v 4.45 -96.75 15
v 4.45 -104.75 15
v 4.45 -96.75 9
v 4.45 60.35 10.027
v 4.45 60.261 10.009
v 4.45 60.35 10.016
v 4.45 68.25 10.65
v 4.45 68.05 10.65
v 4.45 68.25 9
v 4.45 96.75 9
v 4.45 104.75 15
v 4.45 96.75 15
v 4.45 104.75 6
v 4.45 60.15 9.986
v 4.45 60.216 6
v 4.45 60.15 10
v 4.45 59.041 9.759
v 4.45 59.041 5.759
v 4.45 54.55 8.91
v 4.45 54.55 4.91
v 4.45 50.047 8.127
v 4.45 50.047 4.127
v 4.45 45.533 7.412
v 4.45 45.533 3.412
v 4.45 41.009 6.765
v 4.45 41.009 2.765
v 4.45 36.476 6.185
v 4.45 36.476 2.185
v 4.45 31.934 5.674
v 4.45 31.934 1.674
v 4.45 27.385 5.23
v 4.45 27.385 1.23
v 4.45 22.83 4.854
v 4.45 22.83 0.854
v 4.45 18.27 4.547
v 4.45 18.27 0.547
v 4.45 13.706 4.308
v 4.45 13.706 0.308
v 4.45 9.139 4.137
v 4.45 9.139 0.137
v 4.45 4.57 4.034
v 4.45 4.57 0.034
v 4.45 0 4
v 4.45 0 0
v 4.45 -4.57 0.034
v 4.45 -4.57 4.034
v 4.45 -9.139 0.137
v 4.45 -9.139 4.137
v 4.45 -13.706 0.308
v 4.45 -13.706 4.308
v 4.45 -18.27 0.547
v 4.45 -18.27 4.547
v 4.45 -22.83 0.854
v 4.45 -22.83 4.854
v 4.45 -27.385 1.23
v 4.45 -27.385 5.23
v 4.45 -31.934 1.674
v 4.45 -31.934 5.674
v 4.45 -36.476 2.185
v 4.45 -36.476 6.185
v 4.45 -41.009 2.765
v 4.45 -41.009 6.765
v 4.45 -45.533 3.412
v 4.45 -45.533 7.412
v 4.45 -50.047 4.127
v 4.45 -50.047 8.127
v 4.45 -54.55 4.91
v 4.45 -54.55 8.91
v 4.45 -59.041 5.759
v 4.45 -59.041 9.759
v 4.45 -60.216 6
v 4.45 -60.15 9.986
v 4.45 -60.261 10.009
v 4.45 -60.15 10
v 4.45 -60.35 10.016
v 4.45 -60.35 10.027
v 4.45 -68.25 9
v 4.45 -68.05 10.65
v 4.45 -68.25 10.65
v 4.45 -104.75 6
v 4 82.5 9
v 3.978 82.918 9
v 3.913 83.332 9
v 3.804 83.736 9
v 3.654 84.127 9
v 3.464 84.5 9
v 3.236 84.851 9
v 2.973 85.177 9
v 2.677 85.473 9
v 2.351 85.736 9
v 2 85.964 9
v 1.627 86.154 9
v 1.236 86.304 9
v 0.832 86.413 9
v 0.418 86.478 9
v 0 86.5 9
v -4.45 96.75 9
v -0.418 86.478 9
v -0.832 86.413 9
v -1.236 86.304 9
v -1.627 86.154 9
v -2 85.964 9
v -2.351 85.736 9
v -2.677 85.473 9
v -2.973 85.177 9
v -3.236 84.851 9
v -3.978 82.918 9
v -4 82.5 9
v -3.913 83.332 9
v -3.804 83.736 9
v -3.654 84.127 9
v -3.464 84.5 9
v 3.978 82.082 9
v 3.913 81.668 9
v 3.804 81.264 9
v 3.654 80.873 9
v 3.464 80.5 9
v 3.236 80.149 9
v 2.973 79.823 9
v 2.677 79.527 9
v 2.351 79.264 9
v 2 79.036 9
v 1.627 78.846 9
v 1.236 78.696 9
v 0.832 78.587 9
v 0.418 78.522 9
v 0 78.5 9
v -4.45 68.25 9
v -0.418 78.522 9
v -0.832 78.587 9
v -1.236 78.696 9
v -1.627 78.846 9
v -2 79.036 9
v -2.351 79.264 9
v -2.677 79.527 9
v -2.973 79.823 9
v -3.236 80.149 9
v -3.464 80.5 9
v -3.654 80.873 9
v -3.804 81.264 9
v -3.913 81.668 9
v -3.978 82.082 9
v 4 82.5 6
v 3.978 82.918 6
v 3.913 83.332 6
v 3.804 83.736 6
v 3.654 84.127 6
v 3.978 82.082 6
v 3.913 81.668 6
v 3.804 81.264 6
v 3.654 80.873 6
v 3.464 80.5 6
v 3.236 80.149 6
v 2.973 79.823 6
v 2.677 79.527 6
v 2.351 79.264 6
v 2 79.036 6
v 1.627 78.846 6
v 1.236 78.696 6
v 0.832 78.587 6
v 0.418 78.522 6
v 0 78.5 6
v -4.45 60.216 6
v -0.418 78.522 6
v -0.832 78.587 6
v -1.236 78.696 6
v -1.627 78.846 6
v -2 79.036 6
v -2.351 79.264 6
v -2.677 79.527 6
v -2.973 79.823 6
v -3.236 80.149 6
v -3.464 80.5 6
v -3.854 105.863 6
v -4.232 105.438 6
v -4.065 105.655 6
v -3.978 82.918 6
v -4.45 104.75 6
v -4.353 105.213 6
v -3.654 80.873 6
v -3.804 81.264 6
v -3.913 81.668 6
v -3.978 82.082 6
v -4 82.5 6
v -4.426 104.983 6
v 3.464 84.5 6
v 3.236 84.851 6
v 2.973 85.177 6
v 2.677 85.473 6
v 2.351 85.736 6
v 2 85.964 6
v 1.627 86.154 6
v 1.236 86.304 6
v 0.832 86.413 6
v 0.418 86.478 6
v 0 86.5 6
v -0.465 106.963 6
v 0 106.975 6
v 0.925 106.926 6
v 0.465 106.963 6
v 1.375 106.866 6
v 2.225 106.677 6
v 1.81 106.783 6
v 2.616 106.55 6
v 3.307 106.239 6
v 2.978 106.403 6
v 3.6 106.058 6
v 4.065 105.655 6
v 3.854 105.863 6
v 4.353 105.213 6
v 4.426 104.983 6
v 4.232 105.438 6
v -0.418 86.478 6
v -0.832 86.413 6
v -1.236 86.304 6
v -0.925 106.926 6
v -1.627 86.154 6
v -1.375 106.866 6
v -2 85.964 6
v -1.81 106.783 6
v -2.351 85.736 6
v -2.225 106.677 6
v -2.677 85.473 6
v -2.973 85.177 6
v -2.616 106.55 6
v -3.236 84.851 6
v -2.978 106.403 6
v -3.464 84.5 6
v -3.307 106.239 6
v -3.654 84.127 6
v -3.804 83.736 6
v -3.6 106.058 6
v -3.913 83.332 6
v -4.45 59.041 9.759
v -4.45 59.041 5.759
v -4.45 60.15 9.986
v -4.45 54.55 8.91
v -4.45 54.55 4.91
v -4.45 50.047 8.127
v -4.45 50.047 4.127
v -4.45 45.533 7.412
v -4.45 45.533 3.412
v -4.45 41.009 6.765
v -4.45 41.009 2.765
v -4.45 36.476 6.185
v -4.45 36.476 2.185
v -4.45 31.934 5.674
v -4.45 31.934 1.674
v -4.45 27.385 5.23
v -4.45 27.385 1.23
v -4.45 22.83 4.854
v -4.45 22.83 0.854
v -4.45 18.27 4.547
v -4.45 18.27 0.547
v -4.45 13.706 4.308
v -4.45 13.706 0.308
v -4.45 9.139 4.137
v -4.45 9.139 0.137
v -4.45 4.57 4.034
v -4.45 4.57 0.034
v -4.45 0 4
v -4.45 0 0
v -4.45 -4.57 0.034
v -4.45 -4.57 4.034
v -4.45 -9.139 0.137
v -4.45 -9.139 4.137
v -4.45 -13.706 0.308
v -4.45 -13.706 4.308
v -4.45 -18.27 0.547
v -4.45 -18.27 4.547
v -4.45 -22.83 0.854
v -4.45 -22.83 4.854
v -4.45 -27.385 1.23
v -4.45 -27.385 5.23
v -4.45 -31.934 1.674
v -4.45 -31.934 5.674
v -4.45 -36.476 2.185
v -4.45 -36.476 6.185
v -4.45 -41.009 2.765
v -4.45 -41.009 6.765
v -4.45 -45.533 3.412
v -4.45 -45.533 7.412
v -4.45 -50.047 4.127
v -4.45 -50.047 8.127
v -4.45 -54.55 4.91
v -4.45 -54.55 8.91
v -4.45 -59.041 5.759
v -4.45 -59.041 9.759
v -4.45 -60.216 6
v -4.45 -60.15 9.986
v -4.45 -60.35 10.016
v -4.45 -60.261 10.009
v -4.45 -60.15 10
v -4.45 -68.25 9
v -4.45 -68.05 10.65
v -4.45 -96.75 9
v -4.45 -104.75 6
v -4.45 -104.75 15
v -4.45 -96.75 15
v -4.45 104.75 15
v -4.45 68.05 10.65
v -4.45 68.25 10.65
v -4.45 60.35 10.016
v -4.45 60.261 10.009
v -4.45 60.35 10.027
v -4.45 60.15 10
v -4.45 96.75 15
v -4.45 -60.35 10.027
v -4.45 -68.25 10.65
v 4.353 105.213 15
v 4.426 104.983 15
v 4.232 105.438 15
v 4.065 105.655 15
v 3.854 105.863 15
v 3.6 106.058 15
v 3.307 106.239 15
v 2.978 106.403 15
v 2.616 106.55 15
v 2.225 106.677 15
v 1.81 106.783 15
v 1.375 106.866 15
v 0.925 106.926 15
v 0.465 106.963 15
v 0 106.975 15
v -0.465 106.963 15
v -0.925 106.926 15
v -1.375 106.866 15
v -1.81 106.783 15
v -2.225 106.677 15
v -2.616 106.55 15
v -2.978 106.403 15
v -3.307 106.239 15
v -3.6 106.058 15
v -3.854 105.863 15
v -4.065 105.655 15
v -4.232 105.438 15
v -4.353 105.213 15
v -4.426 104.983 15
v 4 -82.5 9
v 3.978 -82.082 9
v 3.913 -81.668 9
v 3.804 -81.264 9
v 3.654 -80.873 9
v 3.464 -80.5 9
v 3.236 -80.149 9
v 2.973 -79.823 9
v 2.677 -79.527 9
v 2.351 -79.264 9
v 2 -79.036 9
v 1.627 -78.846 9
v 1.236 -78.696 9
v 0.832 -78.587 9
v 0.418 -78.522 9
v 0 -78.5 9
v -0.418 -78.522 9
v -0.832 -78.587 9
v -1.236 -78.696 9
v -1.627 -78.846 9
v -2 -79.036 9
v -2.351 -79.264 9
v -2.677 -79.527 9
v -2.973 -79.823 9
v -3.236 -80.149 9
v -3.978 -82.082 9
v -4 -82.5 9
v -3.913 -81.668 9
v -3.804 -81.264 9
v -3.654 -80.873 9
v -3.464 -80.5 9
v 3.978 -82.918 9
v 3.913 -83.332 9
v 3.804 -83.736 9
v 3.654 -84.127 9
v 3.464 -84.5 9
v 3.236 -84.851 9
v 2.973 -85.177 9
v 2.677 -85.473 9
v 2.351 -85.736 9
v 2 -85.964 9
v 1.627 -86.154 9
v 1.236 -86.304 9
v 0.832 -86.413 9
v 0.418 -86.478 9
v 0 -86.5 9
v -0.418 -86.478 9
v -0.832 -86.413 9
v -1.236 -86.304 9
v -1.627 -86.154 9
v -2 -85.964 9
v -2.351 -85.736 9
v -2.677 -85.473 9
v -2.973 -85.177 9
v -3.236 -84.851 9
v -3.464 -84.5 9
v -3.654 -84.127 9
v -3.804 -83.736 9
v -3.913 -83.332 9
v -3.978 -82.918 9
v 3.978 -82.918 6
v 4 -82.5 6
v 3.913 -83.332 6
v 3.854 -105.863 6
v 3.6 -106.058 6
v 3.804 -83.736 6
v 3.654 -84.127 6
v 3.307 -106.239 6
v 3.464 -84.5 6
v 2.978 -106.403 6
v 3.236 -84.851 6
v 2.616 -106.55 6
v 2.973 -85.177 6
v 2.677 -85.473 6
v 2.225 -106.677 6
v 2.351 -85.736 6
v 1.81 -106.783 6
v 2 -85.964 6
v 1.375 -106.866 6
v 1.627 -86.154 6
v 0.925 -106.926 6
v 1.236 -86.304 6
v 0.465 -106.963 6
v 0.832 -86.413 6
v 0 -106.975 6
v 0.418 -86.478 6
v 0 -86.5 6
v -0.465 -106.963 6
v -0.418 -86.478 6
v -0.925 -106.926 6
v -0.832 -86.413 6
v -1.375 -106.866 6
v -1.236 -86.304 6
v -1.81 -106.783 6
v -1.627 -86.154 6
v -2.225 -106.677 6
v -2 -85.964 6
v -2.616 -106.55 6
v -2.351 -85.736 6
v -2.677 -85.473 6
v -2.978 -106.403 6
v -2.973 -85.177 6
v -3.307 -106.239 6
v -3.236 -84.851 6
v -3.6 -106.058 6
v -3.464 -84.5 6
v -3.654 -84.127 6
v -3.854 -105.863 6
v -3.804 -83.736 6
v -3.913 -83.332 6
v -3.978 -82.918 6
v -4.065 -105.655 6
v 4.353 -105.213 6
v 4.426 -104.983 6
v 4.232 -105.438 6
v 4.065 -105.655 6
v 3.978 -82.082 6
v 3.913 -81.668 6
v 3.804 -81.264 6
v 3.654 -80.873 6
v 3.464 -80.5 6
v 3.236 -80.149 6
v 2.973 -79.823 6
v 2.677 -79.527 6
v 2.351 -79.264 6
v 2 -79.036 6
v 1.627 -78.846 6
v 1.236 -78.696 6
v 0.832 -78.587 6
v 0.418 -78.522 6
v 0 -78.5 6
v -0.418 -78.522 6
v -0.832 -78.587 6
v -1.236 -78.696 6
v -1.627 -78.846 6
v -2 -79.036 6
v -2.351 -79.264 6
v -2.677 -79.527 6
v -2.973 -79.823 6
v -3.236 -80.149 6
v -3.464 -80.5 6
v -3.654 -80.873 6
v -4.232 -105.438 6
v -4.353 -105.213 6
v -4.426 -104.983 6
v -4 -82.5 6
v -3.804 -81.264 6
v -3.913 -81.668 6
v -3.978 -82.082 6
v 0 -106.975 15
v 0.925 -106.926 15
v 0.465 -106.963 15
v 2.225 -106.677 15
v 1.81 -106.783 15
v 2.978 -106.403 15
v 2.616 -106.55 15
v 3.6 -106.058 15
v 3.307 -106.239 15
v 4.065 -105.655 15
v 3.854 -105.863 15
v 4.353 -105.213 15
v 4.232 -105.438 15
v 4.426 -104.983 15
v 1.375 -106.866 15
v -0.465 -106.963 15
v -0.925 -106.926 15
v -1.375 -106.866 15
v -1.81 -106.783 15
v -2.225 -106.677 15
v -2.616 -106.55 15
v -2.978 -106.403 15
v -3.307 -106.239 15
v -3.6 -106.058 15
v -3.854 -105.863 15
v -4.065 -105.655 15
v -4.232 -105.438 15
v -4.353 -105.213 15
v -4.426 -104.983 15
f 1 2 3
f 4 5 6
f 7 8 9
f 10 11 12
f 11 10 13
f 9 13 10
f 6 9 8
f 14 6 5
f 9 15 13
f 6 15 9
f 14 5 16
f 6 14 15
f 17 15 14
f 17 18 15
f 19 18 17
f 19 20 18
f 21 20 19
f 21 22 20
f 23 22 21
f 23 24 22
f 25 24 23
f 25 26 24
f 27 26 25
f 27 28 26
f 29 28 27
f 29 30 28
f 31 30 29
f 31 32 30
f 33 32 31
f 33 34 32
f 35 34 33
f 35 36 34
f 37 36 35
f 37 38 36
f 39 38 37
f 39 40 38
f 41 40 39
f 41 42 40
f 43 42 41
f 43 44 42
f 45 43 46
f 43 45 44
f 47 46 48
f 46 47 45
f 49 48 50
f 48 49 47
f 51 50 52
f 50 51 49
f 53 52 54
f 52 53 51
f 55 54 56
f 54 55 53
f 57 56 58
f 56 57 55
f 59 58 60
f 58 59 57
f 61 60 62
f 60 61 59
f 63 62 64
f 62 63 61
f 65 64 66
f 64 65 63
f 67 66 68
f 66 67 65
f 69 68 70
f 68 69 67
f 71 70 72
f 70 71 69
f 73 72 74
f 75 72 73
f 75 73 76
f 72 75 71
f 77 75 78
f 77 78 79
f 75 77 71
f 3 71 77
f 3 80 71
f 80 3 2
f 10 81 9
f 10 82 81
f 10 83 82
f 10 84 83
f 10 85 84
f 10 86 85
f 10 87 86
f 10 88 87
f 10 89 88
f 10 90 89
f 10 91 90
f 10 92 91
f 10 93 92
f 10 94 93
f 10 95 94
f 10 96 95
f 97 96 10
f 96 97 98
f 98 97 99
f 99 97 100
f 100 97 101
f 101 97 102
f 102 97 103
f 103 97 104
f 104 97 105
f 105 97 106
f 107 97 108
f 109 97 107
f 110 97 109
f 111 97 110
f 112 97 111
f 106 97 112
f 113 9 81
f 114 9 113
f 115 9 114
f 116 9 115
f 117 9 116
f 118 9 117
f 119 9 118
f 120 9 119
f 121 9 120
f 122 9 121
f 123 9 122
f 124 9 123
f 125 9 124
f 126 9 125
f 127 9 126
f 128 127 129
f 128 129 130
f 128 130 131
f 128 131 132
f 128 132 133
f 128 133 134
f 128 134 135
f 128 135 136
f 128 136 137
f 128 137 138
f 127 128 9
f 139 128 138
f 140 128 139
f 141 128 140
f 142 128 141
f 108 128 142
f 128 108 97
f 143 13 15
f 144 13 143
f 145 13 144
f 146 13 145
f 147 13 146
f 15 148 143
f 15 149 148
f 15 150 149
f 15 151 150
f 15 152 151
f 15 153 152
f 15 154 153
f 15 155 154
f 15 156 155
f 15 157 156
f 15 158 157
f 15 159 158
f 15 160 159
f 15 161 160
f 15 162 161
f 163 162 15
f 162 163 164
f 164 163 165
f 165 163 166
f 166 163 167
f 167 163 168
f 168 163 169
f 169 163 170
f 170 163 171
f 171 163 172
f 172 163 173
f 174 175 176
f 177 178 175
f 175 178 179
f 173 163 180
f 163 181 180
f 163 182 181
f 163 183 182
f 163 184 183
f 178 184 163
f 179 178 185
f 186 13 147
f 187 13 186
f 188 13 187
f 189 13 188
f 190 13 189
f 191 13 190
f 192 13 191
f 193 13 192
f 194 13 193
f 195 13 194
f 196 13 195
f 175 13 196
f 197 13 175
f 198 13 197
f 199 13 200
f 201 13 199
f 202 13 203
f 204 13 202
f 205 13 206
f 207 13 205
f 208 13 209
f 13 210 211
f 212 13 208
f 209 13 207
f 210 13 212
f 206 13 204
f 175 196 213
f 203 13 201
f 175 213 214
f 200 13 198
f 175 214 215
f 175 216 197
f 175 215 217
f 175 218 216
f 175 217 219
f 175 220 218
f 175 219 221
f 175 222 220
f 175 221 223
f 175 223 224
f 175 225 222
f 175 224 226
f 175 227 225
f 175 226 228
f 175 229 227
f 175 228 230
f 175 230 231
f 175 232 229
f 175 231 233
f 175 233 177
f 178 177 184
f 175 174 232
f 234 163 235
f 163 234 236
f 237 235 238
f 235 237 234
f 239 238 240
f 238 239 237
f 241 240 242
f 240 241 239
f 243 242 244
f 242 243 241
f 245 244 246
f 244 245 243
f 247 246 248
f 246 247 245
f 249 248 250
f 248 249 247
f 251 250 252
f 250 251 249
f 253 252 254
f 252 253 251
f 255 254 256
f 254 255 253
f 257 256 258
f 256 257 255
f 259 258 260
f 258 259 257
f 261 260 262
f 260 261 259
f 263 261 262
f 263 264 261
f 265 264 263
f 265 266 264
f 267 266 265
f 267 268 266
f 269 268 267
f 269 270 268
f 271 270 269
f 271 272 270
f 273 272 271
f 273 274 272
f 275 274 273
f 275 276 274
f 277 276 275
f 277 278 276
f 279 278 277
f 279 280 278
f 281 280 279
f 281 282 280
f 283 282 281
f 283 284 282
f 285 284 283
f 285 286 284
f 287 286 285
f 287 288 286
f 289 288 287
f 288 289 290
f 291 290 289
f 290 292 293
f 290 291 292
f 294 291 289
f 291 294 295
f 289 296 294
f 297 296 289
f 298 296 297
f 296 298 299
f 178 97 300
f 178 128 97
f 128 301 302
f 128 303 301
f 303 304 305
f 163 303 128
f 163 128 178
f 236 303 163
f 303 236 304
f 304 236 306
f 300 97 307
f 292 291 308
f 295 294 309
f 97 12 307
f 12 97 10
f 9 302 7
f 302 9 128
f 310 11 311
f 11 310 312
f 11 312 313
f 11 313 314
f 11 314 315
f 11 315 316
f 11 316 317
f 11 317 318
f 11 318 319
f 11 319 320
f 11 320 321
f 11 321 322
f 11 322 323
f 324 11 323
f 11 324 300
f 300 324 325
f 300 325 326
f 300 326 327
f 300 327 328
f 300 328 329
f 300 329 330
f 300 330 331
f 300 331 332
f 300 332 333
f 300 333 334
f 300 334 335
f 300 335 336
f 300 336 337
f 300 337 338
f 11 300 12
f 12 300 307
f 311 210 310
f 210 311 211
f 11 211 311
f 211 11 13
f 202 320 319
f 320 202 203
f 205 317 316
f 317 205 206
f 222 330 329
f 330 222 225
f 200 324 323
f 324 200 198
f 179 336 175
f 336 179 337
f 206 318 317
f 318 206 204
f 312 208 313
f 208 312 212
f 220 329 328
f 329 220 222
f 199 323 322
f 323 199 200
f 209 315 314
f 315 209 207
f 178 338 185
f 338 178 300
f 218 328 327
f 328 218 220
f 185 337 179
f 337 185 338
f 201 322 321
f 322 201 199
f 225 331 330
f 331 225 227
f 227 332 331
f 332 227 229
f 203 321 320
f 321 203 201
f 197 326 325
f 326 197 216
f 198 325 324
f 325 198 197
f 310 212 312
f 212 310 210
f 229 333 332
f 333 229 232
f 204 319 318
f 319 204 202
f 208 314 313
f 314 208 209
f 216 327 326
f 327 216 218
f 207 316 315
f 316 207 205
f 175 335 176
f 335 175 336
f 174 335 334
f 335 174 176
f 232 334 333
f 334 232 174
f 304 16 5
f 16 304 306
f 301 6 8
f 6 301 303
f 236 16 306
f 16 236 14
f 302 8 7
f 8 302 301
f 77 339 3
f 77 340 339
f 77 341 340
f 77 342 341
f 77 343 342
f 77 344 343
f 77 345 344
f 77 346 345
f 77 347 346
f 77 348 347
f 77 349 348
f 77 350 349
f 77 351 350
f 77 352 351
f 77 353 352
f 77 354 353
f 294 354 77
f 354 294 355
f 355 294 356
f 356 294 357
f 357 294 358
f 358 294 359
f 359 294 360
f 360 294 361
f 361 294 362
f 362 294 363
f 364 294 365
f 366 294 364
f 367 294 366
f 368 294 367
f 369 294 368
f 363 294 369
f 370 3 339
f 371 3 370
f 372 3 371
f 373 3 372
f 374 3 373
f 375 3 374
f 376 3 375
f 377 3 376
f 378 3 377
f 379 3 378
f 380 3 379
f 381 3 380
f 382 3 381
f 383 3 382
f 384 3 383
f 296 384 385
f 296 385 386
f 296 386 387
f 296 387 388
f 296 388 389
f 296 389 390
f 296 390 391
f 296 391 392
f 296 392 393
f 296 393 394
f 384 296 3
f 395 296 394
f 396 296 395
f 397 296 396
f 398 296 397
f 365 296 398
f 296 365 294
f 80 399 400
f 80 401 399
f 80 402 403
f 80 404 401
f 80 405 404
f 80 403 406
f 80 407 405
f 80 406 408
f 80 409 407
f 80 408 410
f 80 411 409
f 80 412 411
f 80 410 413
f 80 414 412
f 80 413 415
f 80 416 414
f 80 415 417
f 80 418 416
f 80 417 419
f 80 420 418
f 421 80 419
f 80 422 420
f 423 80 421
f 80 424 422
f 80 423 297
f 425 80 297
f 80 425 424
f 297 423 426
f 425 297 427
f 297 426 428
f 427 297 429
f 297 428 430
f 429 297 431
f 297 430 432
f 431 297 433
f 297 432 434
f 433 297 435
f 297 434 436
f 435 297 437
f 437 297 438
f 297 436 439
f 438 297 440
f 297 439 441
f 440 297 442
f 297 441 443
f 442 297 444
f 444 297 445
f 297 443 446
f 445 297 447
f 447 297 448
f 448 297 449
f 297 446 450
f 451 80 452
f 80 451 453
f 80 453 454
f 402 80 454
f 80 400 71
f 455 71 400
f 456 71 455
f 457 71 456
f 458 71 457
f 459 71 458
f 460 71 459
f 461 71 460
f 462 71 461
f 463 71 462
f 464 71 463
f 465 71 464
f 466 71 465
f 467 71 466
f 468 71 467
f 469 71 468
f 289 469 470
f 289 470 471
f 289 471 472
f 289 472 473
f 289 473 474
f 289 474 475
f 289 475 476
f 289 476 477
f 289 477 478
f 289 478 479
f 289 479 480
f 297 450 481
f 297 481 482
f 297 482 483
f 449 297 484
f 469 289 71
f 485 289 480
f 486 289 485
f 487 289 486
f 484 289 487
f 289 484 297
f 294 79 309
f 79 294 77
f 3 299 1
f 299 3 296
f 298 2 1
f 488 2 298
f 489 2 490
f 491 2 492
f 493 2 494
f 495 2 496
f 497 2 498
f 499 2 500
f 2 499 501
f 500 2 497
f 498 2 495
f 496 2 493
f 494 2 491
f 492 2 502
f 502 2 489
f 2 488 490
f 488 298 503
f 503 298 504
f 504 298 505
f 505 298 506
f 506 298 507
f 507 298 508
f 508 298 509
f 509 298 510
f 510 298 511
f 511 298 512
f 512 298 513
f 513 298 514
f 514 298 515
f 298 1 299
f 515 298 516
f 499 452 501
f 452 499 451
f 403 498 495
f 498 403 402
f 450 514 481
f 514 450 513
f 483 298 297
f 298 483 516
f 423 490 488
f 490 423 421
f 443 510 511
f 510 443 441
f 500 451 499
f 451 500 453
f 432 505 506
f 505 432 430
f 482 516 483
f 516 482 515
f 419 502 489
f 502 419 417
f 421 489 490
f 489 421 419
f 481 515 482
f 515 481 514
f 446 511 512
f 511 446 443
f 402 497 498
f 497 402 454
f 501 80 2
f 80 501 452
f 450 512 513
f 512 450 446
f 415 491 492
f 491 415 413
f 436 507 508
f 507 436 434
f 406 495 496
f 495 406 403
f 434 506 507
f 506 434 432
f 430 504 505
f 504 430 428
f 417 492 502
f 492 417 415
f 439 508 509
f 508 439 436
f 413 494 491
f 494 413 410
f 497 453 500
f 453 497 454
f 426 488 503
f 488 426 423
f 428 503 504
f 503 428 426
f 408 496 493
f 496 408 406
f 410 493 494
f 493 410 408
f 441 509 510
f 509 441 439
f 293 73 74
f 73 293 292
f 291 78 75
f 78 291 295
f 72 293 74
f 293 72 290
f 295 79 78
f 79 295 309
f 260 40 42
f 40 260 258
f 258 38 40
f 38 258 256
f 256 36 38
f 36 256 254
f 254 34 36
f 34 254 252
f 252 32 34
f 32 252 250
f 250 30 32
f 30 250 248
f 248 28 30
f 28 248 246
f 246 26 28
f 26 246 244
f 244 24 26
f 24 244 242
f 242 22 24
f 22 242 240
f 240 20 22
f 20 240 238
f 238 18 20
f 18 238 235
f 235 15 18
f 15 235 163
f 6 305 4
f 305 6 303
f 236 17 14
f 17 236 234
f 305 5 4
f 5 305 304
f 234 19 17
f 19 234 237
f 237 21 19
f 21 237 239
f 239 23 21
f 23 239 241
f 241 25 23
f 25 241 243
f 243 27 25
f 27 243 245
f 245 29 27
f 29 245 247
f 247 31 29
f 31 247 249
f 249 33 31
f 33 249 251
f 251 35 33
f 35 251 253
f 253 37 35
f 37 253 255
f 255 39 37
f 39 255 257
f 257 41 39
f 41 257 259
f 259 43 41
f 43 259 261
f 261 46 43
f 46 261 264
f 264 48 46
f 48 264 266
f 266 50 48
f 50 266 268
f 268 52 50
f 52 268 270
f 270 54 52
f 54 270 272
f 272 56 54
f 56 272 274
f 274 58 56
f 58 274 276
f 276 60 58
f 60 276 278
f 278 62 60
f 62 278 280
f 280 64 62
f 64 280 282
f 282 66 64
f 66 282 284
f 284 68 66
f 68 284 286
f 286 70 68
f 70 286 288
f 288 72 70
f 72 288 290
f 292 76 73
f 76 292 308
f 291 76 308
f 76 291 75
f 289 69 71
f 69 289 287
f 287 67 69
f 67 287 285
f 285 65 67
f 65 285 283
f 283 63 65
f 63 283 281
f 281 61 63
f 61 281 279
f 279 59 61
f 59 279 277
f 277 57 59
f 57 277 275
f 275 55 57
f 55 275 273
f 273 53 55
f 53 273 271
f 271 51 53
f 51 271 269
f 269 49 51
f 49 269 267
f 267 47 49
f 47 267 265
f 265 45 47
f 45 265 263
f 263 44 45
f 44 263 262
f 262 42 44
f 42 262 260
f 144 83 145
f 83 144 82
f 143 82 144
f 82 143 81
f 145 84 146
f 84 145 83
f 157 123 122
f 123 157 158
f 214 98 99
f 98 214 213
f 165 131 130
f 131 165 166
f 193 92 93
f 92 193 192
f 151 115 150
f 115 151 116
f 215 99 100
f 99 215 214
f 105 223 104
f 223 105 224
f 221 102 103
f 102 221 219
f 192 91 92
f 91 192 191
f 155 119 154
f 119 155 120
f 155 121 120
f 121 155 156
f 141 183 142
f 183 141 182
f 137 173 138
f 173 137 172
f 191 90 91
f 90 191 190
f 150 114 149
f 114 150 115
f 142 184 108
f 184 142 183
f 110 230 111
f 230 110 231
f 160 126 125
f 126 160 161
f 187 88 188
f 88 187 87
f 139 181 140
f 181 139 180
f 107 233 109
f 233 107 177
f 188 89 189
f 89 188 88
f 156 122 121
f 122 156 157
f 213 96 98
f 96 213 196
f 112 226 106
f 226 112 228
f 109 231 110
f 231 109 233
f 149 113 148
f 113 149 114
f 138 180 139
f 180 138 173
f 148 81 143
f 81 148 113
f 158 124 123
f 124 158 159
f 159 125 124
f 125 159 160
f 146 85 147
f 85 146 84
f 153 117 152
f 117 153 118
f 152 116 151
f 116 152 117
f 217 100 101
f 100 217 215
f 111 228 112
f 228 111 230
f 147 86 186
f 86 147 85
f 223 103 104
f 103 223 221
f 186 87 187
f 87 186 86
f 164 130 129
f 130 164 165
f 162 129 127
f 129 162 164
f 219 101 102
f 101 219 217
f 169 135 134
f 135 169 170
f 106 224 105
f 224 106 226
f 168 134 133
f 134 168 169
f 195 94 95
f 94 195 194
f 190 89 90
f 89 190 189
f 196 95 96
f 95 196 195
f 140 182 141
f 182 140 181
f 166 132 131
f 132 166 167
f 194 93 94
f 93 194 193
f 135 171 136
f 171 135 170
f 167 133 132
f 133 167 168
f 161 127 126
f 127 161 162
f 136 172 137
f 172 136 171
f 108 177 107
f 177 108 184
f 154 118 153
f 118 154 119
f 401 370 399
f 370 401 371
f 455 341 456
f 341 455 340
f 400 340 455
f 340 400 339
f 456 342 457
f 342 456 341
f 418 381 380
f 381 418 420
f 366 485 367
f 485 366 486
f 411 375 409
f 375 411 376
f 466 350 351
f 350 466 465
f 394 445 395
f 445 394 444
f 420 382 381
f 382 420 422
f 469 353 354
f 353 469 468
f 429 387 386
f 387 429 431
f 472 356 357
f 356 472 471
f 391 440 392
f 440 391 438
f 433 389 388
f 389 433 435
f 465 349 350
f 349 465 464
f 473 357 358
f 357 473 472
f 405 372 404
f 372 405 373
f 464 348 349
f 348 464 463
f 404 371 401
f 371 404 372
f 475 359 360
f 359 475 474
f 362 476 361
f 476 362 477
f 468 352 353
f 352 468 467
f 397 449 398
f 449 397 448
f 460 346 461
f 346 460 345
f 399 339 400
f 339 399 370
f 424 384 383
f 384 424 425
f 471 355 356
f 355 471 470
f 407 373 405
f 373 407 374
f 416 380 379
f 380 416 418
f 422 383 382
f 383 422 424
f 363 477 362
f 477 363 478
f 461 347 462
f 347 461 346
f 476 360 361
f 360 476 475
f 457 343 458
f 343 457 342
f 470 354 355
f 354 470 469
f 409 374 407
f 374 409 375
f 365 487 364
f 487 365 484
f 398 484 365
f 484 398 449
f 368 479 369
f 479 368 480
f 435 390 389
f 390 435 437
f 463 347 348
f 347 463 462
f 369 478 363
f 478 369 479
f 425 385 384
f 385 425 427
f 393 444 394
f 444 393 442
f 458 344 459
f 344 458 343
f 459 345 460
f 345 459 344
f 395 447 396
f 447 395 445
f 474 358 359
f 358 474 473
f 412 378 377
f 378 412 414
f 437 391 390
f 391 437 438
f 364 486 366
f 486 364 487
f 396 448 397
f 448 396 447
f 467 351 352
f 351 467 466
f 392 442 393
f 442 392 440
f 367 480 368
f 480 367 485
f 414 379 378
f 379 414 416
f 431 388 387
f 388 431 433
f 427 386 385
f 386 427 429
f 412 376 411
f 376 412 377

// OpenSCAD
// Wing-Foil Mast Nut Spacer/Holder
// Version: 0.13

/* [General Settings] */
// Distance between bolt centers
nut_spacing = 165.0;

/* [Track & Nut Dimensions] */
shaft_width = 8.9;
nut_length = 28.5;
nut_thickness = 5.5;
bolt_hole_dia = 8.0;

/* [Holder Design Features] */
base_thickness = 3.0;
bridge_thickness = 4.0;
spring_bow = 6.0;
guide_height = 9.0;
stop_length = 8.0;

// The diameter of the cylinder used for the bottom bump
bottom_bump_dia = 18.0;
// Percent of the cylinder radius to protrude (0.3 = 30%)
bump_profile_percent = 0.3;
// Whether to include the bump
bump = false;

/* [Hidden] */
$fn = 60;
lip_thickness = base_thickness + nut_thickness * 0.3;

module extruded_bridge(w, span, t, bow, overlap=0.4) {
    R = (span*span)/(8*bow) + bow/2;
    rotate([90, 0, 90])
    linear_extrude(w, center=true)
    intersection() {
        translate([0, -bow])
            square([span + overlap, 2*R], center=true);
        translate([0, R - bow])
            difference() {
                // By translating the same circle vertically, we ensure the ends are flat
                // instead of being perpendicular to the curve.
                circle(r=R, $fn=420);
                translate([0, t]) circle(r=R, $fn=420);
            }
    }
}

module complete_spacer() {
    difference() {
        union() {
            for (dir = [1, -1]) {
                nut_y = dir * nut_spacing/2;

                // 1. Base platform
                translate([0, nut_y, base_thickness/2])
                    cube([shaft_width, nut_length, base_thickness], center=true);

                // 2. Outer Vertical Guide Wall (Centering)
                outer_pos = nut_y + dir * (nut_length/2 + stop_length/2);
                translate([0, outer_pos, guide_height/2])
                    cube([shaft_width, stop_length, guide_height], center=true);

                // Rounded tip
                extreme_end = nut_y + dir * (nut_length/2 + stop_length);
                translate([0, extreme_end, guide_height/2])
                    scale([1, 0.5, 1]) cylinder(h=guide_height, d=shaft_width, center=true);

                // 3. Inner Transition (Vertical wall + Slope)
                inner_start = nut_y - dir * nut_length/2;
                inner_end = inner_start - dir * stop_length;

                hull() {
                    translate([0, inner_start - dir*0.1, lip_thickness/2])
                        cube([shaft_width, 0.2, lip_thickness], center=true);
                    translate([0, inner_end, bridge_thickness/2])
                        cube([shaft_width, 0.2, bridge_thickness], center=true);
                }
            }

            // 4. Continuous Spring Bridge
            bridge_span = nut_spacing - nut_length - (stop_length * 2);
            extruded_bridge(w=shaft_width, span=bridge_span, t=bridge_thickness, bow=spring_bow, overlap=0.2);

            // 5. Recessed 30% Bump
            // Positioned so it is cut inside the body and only protrudes from the bottom
            if (bump) {
                bump_radius = bottom_bump_dia / 2;
                protrusion_height = bump_radius * bump_profile_percent;

                translate([0, 0, -spring_bow + bridge_thickness/2])
                intersection() {
                    // The Cylinder
                    translate([0, 0, bump_radius - protrusion_height])
                        rotate([0, 90, 0])
                        cylinder(h=shaft_width, d=bottom_bump_dia, center=true);

                    // The Shaving Cube: Limits the bump to the bridge's vertical volume
                    // This ensures the bump never pokes out the top of the bridge
                    translate([0, 0, -protrusion_height])
                        cube([shaft_width + 1, bottom_bump_dia, bridge_thickness + protrusion_height * 2], center=true);
                }
            }
        }

        // Bolt holes
        for (dir = [1, -1]) {
            nut_y = dir * nut_spacing/2;
            translate([0, nut_y, -1])
                cylinder(h=guide_height + 20, d=bolt_hole_dia);
        }
    }
}

// Final assembly positioning
translate([0, 0, spring_bow])
    complete_spacer();
